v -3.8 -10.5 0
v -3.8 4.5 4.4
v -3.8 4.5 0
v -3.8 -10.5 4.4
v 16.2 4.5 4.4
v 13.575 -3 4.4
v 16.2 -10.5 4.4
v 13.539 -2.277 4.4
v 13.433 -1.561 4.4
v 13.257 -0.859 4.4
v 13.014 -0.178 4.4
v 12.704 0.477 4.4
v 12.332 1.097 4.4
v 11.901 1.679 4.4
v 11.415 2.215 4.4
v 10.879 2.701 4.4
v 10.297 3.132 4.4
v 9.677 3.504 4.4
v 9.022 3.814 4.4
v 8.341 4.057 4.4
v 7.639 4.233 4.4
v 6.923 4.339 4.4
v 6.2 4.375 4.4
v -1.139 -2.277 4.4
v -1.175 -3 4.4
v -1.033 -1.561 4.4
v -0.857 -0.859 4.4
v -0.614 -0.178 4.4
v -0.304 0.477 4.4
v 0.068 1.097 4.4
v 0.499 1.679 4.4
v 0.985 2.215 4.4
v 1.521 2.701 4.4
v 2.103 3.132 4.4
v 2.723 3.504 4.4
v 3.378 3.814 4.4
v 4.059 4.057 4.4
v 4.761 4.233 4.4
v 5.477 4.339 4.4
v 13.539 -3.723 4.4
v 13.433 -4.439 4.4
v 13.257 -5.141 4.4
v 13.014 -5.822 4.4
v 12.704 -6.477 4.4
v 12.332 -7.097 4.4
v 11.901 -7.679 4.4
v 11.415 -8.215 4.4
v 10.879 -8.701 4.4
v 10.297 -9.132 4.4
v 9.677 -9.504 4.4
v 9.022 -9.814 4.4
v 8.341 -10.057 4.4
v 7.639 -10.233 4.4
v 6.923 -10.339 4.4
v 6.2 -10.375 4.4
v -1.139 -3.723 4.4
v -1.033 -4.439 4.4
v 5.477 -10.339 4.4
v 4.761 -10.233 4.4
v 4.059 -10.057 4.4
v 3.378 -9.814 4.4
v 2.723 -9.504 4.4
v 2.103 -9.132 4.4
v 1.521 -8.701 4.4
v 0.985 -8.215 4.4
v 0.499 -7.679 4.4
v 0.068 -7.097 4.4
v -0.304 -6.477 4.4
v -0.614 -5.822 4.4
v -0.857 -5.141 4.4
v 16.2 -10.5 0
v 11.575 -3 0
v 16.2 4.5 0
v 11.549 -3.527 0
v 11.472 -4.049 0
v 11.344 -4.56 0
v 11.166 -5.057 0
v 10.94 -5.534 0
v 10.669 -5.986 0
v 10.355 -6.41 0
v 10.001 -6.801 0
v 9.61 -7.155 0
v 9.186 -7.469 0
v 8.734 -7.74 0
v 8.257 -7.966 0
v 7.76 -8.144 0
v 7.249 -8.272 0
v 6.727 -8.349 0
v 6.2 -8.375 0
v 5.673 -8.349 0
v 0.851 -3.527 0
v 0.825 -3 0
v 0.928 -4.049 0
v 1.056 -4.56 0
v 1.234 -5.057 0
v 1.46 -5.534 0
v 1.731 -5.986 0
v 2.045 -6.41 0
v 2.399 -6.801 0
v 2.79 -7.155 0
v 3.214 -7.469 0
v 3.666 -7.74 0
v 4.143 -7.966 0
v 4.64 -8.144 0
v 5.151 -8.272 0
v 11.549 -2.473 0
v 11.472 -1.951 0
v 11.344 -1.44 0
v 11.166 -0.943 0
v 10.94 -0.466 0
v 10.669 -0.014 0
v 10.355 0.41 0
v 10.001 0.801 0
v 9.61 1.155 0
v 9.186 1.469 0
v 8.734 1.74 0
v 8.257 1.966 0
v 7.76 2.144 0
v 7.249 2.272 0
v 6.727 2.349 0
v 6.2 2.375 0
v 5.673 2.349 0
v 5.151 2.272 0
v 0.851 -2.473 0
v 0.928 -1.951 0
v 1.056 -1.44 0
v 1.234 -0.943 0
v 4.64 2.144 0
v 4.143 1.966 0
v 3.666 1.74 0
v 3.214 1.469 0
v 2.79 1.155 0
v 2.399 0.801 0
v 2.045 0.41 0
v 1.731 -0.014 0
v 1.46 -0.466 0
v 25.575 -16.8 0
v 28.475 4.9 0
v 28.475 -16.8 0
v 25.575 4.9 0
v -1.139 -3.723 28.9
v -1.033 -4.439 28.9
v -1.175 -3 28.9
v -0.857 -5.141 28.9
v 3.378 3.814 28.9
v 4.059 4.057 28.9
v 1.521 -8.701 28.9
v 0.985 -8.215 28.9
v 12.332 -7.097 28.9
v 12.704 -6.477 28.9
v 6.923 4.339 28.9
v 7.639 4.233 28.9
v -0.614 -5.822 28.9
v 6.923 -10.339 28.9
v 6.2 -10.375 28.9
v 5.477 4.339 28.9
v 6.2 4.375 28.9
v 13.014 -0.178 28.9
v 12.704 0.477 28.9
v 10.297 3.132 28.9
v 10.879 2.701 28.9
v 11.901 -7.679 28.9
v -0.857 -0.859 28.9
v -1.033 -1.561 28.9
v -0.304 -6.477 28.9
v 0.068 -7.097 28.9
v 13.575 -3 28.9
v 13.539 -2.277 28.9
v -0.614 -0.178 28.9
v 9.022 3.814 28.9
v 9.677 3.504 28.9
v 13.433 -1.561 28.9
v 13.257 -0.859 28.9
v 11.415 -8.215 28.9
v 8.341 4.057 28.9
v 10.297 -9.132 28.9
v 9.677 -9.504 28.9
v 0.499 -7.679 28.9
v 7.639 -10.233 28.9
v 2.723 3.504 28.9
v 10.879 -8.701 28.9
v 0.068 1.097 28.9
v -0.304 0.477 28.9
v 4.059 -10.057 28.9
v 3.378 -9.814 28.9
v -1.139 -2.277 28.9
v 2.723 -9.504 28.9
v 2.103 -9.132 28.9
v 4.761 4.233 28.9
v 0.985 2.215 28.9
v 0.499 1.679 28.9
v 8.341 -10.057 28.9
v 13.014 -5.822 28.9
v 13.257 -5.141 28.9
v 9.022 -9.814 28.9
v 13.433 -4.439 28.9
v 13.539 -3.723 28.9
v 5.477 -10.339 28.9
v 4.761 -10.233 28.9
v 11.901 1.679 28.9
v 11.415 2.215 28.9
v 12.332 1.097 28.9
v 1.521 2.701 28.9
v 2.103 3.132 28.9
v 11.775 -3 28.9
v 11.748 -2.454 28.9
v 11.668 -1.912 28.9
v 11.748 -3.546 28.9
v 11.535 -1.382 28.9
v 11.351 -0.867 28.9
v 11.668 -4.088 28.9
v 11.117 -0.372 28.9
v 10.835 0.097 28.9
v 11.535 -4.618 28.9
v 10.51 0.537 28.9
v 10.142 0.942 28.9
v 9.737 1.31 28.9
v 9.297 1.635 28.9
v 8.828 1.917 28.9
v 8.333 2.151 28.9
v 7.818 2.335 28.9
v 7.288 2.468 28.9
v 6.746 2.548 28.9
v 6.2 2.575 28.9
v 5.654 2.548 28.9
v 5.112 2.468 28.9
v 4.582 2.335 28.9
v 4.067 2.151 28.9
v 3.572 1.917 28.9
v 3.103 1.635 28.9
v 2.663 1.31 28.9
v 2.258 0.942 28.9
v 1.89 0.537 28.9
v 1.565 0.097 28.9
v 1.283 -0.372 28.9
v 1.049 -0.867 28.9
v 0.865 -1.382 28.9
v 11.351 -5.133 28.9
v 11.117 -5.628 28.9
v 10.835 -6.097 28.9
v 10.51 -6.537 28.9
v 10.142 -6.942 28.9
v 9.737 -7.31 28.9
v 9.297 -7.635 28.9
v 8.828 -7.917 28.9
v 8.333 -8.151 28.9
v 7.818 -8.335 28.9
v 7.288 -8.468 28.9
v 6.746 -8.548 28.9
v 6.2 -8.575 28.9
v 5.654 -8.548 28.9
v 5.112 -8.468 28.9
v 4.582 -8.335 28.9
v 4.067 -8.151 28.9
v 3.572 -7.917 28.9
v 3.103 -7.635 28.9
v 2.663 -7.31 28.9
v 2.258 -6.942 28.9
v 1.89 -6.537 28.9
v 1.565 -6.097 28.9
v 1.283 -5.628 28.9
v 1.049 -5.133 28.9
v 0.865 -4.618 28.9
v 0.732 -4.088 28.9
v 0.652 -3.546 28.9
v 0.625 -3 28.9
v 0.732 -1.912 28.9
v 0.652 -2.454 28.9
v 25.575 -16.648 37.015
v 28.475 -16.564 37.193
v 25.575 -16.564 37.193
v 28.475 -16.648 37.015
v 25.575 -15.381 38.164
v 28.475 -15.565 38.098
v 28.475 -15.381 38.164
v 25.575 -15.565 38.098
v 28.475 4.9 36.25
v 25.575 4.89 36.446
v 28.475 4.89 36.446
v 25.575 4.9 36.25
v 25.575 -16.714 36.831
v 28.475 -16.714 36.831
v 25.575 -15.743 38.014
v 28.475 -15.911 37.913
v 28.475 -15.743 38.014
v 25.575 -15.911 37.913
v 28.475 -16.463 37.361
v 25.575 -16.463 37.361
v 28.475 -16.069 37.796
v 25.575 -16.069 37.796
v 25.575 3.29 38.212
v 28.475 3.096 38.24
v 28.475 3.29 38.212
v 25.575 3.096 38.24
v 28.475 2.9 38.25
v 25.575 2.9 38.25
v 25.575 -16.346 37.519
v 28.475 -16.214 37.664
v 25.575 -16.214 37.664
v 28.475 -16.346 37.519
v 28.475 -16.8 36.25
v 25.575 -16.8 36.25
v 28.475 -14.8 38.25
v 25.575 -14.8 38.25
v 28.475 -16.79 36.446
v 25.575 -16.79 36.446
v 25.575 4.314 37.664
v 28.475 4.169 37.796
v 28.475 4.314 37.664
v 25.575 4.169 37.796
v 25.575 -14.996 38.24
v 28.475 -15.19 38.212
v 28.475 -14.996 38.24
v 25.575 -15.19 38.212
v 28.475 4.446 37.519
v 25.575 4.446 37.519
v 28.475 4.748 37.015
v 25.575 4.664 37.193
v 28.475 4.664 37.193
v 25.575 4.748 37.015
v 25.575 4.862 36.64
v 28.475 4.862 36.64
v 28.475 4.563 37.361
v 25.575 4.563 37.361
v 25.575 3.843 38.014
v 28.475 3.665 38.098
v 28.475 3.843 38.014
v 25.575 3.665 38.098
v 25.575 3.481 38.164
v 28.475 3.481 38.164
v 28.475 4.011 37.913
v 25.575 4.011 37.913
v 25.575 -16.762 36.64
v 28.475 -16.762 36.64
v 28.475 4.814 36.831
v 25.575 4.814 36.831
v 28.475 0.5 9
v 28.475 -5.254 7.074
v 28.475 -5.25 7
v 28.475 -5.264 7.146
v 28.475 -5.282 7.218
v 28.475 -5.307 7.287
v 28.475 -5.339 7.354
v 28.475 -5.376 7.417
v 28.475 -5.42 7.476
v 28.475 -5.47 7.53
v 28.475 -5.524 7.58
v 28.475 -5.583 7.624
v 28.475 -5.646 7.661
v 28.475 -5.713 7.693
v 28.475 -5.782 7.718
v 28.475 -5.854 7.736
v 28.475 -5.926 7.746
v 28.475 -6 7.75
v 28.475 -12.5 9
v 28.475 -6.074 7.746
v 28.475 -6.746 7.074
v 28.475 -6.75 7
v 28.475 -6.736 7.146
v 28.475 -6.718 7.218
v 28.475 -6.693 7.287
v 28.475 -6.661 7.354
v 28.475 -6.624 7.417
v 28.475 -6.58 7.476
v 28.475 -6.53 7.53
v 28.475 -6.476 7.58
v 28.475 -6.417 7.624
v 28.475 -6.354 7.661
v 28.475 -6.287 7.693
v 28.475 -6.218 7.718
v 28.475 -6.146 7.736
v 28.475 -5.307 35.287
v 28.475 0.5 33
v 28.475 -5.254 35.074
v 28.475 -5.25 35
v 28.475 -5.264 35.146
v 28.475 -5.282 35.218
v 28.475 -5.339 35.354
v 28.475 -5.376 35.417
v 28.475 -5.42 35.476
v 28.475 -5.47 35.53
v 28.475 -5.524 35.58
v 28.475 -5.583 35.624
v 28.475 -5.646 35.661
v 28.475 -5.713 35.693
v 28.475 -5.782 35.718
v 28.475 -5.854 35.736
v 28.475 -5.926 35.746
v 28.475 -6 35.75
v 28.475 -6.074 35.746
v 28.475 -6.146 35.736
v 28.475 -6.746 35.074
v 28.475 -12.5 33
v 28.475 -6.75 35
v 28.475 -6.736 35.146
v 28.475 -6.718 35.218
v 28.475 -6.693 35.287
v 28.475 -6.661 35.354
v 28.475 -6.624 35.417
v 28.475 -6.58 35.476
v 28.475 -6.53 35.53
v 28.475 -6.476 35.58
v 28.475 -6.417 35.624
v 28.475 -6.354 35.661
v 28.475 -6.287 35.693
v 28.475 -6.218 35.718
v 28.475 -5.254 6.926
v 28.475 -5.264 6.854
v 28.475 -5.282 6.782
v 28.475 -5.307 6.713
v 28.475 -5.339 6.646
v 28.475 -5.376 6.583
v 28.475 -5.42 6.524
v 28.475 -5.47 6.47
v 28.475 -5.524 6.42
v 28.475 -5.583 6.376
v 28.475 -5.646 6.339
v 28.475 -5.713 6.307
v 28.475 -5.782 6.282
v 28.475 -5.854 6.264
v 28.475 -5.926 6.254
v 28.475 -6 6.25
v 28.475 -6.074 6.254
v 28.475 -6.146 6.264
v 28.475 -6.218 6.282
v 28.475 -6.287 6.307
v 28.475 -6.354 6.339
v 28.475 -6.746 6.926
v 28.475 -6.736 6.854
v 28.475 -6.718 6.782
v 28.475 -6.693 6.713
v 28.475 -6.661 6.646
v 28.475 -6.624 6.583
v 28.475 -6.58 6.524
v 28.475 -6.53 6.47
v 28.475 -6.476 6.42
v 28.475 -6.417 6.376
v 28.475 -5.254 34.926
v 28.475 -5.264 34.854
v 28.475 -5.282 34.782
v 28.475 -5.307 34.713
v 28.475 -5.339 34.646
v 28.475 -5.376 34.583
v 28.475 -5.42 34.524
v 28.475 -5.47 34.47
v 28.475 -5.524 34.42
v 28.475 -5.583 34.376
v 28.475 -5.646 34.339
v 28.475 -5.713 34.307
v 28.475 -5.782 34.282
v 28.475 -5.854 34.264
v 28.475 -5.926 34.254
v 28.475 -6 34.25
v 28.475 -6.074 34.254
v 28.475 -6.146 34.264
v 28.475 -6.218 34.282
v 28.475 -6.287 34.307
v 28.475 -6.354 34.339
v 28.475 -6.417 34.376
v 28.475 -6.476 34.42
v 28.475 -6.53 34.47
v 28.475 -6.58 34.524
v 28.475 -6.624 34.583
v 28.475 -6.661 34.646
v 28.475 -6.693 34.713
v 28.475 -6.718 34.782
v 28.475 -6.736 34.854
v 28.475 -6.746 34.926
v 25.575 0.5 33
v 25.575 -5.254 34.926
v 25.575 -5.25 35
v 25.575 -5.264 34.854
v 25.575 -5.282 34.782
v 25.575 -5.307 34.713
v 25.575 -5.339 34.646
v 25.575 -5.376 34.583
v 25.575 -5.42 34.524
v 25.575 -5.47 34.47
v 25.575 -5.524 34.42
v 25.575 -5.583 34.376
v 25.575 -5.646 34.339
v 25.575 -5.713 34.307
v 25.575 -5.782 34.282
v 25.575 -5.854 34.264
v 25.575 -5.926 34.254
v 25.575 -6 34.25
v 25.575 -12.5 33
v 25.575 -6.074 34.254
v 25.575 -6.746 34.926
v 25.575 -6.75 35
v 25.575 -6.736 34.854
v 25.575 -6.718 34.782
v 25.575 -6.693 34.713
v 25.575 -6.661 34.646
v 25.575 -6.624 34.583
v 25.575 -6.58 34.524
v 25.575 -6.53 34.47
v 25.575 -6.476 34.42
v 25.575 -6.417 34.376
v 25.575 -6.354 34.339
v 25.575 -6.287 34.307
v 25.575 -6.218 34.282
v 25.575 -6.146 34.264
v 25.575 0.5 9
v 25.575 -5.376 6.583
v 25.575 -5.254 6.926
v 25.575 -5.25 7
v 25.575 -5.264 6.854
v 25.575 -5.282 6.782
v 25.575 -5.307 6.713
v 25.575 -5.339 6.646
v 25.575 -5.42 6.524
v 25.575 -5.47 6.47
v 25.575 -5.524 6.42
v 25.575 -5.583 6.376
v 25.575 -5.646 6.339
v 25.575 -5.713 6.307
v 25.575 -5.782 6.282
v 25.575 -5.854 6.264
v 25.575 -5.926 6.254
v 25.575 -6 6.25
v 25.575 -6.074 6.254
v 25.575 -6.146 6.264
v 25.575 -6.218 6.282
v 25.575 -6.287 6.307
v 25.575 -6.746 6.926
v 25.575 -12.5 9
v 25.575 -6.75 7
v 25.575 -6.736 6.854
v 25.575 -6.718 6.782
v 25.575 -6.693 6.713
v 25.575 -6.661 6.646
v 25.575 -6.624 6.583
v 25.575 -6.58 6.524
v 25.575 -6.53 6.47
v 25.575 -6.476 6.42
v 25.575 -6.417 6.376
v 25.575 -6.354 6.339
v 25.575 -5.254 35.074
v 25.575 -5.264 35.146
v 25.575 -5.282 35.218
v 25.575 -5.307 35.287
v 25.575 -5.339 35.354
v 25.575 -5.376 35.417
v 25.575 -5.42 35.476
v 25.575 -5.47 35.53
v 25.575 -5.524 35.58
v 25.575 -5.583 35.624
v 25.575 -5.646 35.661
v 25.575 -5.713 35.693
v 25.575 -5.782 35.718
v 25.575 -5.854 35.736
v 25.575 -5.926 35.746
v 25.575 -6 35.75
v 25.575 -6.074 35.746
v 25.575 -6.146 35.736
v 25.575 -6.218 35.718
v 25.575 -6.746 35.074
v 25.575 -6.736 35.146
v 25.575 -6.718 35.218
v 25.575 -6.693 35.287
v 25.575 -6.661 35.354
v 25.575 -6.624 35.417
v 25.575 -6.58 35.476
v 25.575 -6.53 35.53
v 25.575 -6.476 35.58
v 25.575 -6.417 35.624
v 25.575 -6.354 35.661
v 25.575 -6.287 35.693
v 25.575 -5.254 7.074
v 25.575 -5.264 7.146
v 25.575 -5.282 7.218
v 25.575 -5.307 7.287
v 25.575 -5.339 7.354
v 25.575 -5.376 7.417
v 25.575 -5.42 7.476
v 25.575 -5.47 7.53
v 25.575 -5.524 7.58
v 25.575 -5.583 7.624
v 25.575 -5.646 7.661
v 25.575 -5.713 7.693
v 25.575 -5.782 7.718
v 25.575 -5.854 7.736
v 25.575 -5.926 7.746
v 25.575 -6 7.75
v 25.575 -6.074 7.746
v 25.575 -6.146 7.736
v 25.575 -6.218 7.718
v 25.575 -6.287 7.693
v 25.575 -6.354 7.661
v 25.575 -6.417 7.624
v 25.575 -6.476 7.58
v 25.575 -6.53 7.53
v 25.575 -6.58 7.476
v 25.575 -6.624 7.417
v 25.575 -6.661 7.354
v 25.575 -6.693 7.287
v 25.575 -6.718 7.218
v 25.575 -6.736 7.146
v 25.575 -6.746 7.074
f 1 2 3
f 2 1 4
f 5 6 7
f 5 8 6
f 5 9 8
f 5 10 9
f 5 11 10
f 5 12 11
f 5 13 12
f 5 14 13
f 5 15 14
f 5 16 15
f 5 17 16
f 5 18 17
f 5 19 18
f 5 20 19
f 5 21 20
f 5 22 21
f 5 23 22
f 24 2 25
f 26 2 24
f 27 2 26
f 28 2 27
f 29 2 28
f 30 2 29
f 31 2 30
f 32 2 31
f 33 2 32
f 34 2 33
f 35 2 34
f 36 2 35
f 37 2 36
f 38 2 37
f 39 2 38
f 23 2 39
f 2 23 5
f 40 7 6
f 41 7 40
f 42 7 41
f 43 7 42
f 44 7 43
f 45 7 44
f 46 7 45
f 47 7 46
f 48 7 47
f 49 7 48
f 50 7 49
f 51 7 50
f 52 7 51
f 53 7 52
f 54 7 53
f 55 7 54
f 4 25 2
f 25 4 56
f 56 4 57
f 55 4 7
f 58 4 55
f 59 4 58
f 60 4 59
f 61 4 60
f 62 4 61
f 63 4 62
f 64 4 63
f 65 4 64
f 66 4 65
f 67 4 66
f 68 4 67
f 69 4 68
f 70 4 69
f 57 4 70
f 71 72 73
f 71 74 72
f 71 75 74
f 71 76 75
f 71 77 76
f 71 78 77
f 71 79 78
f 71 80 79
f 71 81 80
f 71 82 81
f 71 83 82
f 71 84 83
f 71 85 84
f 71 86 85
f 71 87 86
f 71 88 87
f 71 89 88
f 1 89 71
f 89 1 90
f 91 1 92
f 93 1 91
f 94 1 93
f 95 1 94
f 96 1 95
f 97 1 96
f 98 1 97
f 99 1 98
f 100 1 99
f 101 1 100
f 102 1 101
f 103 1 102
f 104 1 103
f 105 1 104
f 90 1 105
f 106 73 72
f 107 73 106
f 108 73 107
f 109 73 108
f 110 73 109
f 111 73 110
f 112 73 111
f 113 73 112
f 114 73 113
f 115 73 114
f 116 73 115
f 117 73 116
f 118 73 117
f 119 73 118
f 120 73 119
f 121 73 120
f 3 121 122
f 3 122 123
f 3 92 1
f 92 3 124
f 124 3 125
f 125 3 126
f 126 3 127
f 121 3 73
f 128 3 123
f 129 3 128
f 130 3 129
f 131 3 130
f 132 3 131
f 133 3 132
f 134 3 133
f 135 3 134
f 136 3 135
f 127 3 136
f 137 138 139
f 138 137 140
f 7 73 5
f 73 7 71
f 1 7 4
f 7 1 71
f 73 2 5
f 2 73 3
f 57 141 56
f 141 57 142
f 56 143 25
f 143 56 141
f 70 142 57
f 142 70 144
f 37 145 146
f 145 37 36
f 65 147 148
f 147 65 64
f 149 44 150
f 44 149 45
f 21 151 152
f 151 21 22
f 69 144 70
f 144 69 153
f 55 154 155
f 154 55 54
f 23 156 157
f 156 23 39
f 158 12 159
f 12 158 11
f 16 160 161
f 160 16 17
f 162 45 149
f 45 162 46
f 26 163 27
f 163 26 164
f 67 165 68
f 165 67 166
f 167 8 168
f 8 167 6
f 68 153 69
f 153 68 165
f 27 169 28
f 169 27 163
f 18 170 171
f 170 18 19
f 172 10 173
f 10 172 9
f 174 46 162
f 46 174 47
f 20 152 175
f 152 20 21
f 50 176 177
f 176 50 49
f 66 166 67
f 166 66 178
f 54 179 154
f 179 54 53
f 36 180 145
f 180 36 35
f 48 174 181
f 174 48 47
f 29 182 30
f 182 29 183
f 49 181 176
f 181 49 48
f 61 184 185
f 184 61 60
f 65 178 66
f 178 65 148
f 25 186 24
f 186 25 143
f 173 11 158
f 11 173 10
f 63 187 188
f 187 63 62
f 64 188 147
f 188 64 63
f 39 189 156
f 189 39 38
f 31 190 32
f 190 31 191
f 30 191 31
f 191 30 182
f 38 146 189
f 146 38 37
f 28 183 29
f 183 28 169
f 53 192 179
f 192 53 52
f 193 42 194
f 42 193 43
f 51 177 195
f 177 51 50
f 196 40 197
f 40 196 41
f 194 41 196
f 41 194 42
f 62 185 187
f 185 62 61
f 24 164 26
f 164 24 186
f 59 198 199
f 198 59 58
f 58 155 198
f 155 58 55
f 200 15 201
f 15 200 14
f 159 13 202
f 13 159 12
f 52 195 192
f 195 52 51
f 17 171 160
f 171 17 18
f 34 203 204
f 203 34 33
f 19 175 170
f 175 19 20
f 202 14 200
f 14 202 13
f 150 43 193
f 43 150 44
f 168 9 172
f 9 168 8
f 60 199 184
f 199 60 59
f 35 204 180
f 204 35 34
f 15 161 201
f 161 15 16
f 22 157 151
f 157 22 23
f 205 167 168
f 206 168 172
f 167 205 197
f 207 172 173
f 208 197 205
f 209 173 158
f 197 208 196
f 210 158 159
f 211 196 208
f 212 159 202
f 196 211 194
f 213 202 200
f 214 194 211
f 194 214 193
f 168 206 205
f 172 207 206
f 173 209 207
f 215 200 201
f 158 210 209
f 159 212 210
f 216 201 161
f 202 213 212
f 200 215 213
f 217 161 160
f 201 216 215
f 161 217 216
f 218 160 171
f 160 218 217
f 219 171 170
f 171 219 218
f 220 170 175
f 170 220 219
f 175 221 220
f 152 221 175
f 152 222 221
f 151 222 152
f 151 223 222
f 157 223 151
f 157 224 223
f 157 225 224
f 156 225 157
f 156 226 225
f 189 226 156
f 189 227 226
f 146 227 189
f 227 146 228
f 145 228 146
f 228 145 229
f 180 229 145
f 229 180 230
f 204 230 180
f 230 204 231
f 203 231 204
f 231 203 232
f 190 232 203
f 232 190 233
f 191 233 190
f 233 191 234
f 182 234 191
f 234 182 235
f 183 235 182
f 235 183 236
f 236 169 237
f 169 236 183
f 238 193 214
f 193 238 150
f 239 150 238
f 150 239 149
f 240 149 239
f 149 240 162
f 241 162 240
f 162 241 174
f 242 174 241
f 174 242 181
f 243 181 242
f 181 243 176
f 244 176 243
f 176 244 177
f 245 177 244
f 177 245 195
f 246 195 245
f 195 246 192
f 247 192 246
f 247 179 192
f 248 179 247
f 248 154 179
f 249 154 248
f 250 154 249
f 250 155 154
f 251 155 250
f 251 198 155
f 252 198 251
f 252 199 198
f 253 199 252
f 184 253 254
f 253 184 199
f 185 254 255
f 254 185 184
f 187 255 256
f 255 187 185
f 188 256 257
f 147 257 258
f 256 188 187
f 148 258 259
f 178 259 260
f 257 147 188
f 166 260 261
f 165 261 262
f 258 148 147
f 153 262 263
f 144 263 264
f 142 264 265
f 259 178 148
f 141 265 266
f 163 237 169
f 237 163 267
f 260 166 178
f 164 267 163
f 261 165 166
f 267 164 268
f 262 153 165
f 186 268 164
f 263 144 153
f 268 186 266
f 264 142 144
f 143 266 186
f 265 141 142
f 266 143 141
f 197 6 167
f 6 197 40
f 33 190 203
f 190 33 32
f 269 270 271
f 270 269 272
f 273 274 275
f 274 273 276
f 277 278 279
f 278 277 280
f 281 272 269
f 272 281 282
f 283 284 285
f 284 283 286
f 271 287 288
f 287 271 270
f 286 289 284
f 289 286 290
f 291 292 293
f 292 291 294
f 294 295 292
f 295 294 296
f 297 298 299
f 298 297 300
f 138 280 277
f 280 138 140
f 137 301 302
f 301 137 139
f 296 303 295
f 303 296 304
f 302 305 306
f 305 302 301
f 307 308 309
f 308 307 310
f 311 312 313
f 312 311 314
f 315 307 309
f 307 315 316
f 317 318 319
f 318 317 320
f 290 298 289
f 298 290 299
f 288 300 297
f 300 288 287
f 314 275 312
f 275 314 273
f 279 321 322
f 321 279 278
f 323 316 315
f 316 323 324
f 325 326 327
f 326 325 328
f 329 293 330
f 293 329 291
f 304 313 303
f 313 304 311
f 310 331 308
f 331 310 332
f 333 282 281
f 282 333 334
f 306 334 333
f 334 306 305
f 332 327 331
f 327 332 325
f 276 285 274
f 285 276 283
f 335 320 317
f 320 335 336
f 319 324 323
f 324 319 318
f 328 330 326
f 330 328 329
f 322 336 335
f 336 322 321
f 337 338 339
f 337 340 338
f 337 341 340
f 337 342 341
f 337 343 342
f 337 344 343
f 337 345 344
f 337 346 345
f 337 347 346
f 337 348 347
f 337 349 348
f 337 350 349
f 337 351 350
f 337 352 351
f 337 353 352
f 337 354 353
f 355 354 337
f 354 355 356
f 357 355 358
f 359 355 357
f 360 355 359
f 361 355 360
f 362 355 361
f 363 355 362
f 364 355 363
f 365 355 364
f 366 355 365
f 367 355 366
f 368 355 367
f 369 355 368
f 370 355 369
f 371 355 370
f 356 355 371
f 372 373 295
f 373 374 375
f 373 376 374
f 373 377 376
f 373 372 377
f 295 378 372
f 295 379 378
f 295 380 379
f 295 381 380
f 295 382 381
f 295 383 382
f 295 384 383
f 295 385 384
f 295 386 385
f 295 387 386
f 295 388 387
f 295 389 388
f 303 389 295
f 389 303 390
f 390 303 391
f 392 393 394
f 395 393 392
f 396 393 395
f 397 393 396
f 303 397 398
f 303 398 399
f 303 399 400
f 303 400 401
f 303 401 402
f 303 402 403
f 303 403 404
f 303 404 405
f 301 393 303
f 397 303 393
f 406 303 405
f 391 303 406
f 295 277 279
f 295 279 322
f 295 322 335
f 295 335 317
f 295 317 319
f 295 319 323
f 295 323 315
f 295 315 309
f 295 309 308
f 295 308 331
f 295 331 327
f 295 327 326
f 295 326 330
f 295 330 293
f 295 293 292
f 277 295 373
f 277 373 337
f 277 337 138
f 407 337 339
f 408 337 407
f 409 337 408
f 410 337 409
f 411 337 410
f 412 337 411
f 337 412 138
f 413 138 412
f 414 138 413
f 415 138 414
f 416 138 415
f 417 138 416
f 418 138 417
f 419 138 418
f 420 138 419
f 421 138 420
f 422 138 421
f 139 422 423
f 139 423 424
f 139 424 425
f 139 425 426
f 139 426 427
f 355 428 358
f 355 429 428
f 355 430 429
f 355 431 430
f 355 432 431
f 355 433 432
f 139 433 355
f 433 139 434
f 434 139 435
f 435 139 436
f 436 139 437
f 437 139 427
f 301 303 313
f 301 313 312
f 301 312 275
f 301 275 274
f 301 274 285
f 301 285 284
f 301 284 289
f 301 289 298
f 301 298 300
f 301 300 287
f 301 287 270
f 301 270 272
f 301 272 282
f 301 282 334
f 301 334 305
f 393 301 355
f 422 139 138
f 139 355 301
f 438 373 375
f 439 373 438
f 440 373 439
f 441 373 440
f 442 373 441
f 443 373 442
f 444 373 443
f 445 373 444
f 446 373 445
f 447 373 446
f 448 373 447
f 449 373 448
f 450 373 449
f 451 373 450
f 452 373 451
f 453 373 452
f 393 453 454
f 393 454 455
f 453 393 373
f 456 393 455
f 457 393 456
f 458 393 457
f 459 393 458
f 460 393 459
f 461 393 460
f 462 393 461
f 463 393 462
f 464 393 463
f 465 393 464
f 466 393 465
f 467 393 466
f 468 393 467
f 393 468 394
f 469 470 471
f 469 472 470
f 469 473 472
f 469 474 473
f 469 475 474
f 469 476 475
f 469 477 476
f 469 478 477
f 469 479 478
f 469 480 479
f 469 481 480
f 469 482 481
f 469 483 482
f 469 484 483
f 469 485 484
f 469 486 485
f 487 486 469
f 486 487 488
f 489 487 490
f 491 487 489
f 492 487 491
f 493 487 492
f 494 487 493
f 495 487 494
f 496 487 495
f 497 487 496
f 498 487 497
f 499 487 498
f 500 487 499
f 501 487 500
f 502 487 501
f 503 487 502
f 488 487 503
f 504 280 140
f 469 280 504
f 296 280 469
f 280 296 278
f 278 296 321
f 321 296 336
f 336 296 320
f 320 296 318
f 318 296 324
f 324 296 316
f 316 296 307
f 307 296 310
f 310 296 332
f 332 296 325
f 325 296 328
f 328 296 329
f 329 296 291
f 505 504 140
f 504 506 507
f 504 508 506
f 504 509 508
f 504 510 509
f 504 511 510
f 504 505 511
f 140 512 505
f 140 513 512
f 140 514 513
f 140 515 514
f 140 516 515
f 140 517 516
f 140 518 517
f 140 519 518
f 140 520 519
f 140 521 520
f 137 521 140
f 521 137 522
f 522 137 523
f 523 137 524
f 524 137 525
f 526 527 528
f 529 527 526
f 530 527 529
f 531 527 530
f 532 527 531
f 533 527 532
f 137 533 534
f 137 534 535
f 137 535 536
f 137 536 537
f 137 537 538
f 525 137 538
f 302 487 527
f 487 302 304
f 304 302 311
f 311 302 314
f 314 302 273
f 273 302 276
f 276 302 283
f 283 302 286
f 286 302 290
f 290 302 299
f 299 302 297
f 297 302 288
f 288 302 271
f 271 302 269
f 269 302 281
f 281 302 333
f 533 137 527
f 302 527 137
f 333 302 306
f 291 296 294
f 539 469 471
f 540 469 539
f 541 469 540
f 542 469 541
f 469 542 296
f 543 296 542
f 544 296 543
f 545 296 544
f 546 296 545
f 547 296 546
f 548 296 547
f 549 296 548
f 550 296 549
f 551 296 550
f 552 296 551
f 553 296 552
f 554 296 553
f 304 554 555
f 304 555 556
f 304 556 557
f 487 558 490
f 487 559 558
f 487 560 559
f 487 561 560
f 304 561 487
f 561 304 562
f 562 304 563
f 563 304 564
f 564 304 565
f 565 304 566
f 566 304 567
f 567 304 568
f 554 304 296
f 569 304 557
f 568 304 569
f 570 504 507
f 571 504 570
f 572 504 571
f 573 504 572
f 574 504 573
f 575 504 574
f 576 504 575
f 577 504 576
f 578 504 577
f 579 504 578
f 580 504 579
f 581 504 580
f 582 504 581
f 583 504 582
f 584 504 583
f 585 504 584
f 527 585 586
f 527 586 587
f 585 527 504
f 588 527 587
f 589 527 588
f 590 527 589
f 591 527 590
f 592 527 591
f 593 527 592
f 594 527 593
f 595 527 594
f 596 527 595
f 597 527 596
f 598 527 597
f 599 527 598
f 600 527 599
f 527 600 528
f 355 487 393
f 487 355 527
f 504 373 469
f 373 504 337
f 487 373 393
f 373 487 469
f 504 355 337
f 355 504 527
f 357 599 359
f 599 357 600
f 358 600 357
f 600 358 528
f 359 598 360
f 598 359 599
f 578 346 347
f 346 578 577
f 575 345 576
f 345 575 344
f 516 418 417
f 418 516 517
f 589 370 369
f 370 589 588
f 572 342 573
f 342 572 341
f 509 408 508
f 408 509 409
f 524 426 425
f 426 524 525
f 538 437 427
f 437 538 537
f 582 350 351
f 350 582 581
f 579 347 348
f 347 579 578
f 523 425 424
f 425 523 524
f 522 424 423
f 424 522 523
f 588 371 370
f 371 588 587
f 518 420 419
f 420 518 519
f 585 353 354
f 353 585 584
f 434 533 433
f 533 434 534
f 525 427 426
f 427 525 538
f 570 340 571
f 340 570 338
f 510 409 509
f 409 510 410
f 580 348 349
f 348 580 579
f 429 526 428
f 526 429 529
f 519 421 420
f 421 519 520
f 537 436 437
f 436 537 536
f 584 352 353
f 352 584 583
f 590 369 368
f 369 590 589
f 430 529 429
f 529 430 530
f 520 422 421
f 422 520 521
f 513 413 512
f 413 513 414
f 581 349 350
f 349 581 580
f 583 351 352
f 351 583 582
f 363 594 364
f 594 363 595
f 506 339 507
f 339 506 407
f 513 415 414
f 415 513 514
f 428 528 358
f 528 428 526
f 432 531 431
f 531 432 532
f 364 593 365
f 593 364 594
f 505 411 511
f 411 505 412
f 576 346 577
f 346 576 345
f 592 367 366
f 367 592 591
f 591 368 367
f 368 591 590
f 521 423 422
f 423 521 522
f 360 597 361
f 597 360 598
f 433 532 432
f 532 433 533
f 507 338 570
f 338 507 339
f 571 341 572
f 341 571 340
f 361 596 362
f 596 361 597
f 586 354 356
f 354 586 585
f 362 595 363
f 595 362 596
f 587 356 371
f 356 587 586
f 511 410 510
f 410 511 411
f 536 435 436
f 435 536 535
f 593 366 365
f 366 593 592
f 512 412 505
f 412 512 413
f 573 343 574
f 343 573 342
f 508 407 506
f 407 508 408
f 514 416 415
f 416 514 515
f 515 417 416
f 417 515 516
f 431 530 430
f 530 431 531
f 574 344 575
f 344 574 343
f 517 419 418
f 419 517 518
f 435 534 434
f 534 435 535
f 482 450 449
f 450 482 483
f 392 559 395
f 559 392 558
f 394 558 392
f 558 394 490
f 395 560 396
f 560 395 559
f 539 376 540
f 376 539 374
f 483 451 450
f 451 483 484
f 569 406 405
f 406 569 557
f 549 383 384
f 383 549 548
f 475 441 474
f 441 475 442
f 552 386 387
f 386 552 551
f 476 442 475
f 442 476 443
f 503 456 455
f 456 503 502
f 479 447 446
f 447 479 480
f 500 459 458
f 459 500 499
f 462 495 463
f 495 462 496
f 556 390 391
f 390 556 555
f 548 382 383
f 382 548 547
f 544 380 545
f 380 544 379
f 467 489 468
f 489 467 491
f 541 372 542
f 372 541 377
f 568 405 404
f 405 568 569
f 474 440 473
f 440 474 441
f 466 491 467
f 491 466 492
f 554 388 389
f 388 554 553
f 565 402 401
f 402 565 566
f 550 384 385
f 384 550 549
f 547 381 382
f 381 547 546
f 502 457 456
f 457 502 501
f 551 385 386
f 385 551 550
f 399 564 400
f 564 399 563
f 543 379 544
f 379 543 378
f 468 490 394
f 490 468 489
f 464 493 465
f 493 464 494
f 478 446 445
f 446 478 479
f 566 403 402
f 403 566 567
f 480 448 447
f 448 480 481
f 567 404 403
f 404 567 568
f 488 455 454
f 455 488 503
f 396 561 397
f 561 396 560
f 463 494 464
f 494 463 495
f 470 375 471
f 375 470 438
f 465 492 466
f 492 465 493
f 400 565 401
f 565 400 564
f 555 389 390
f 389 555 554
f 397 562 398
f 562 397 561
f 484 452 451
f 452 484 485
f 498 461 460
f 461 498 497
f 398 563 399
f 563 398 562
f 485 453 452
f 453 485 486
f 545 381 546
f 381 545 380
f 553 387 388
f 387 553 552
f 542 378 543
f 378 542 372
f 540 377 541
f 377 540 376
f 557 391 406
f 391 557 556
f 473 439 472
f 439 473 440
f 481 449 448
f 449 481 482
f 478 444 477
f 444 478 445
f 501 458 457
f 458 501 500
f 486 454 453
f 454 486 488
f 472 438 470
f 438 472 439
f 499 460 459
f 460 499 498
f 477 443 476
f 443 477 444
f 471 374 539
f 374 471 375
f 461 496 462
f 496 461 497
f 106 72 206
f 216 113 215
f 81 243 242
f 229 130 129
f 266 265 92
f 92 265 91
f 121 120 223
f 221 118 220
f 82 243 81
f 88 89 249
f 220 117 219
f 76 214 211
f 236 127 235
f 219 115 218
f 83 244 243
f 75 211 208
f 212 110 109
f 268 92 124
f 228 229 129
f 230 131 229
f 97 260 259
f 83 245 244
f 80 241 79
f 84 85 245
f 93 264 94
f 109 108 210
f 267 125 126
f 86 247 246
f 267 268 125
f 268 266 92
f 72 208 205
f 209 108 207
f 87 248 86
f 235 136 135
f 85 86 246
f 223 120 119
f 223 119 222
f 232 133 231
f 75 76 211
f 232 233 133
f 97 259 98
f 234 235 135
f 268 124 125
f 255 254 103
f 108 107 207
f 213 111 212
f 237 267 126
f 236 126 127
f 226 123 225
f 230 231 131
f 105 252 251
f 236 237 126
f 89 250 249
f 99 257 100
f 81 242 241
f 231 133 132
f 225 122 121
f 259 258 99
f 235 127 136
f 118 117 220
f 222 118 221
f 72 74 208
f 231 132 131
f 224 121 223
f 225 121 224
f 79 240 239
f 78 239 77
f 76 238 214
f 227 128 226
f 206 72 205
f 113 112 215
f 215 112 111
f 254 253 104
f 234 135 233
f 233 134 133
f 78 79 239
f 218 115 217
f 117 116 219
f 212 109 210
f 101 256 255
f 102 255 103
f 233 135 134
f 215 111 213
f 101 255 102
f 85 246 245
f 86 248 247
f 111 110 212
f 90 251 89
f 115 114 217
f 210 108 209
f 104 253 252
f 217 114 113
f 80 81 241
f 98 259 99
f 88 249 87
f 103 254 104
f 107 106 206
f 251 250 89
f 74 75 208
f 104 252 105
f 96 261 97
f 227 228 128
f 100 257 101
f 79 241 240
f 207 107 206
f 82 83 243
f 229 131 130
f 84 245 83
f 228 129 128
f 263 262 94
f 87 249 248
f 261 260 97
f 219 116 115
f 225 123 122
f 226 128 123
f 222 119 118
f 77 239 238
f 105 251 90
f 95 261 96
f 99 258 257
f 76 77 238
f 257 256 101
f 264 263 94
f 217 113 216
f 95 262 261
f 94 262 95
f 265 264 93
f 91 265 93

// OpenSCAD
// pen holder for plotting robot




// Diameter of pen in mm.
penDiameter = 10.75;  // 10.60

union();

$fn = 64;

barrelDiameter = 15; // don't change or M3 holes shift

penRadius = penDiameter / 2;
barrelHieght = 24 + 2;
barrelWallThickness = 2;
baseThickness = 2.9;
cornerRounding = 2;
M3holeDia = 3.5;
M3nutDia = 6.6;
holeOffset = M3holeDia * 1.2;
baseLen = 15;
//baseWid = penDiameter + 2 * barrelWallThickness + 2;
baseWid = 20;
echo(baseWid);
echo(baseLen);


// servo bracket variables
servoOveralHeight = 34.5;  // 34.5 
servoBodyHeight = 24;
servoBodyWidth = 13;
servoScrewDia = 1.5;
servoScrewOffset = 2;
servoHeightOffset = barrelHieght - 5;
servoFwdOffset = penRadius + barrelWallThickness + baseThickness + 12;

rotate([0, 0, 180])
translate([-6.2, 3, 0])
difference(){
	union(){
		penHolder();
		servoBracket();
	}
    // re-drill the hole covered by servoBracket
	translate([0, 0, 0])
	cylinder(barrelHieght + baseThickness, penRadius, penRadius+0.2);

    translate([-40, -40, -40])
    cube([80, 80, 40]);

    rotate([0, 0, 0])
    union(){
		
		// pen hole
		//
    }
}	



module roundedCube(xdim ,ydim ,zdim, rdim){
	hull(){ // https://youtu.be/gKOkJWiTgAY
		translate([rdim, rdim, 0]) cylinder(zdim, rdim, rdim);
		translate([xdim-rdim, rdim, 0]) cylinder(zdim, rdim, rdim);
		translate([rdim, ydim-rdim, 0]) cylinder(zdim, rdim, rdim);
		translate([xdim-rdim, ydim-rdim, 0]) cylinder(zdim, rdim, rdim);
	}
}


module halfRoundedCube(xdim ,ydim ,zdim, rdim){
	hull(){ // only round two sides
		translate([0, rdim, 0]) cube([2, rdim * 2, zdim]);
		translate([xdim-rdim, rdim, 0]) cube([rdim, rdim * 2, zdim]);
		translate([rdim, ydim-rdim, 0]) cylinder(zdim, rdim, rdim);
		translate([xdim-rdim, ydim-rdim, 0]) cylinder(zdim, rdim, rdim);
	}
}


module halfRoundedCube2(xdim ,ydim ,zdim, rdim){
	hull(){ // https://youtu.be/gKOkJWiTgAY
		translate([rdim, rdim, 0]) cylinder(zdim, rdim, rdim);
		translate([xdim-rdim, 0, 0]) cube([rdim, rdim * 2, zdim ]);
		translate([rdim, ydim-rdim, 0]) cylinder(zdim, rdim, rdim);
		translate([xdim-rdim, ydim-rdim, 0]) cube([zdim, rdim, rdim]);
	}
}


module halfRoundedCube3(xdim ,ydim ,zdim, rdim){
	hull(){ // https://youtu.be/gKOkJWiTgAY
		translate([rdim, rdim, 0]) cylinder(zdim, rdim, rdim);
		translate([xdim-rdim, rdim, 0]) cylinder(zdim, rdim, rdim);
		translate([0, ydim-rdim, 0]) cube([zdim, rdim, rdim]);
		translate([xdim-rdim, ydim-rdim, 0]) cube([zdim, rdim, rdim + 1]);
	}
}



module penHolder(){
	// base plate
    rotate([0, 0, 0])
	difference(){
		translate([	-baseWid / 2, -baseLen / 2, 0])

		// base piece
		//roundedCube(baseWid, baseLen, baseThickness, cornerRounding);
        cube([baseWid, baseLen, baseThickness + 1.5]);

		// pen hole
		//cylinder(baseThickness, penRadius, penRadius);
    };


	// pen barrel
	translate([0, 0, baseThickness])
	difference(){
		// barrel
		cylinder(	barrelHieght, 
					penRadius + barrelWallThickness, 
					penRadius + barrelWallThickness );
		// bore
		//cylinder(barrelHieght, penRadius, penRadius + 0.25);	
	}
}


module servoBracket(){
	// servo bracket face
	//rotate([0, 90, 90]) // (z, z, x) now
	//translate([	-servoHeightOffset, 0, servoFwdOffset])
    translate([-servoFwdOffset, 3, servoHeightOffset])
    rotate([90, 0, 90])

 
	difference(){
		// base 

		union(){

            
			translate([-(   servoBodyWidth + 2 * baseThickness) / 2 -1.5,
						 	-servoOveralHeight / 2 - 6, 0])
			halfRoundedCube(servoBodyWidth + 3 * baseThickness,
							servoOveralHeight + 6, 
                            baseThickness, cornerRounding);         
		}
        
        // cut off underneath
        //translate([-50, -50, -100])
        //cube([100, 100, 100]);
        
        // base holes
		translate([ -(servoBodyWidth + 2 * baseThickness) / 2 + M3holeDia,
					-servoOveralHeight / 2 + 1, 10 / 1.5])
		rotate([90, 0, 0])
		cylinder(baseThickness + 2, d=M3holeDia, d=M3holeDia);

		// body cutout
		translate([-servoBodyWidth / 2, -servoBodyHeight / 2, 0])
		cube([servoBodyWidth, servoBodyHeight , baseThickness + 1]);

		//translate([-servoBodyWidth / 2, 0.6, 0])
		//cube([servoBodyWidth, servoBodyHeight / 2 - 0.6, baseThickness + 1]);

		// vertical screw holes
		translate([0, -servoBodyHeight / 2 - servoScrewOffset, 0])
		cylinder(baseThickness + 1, servoScrewDia / 2, servoScrewDia / 2);
		translate([0, servoBodyHeight / 2 + servoScrewOffset, 0])
		cylinder(baseThickness + 1, servoScrewDia / 2, servoScrewDia / 2);
        

	}


}
